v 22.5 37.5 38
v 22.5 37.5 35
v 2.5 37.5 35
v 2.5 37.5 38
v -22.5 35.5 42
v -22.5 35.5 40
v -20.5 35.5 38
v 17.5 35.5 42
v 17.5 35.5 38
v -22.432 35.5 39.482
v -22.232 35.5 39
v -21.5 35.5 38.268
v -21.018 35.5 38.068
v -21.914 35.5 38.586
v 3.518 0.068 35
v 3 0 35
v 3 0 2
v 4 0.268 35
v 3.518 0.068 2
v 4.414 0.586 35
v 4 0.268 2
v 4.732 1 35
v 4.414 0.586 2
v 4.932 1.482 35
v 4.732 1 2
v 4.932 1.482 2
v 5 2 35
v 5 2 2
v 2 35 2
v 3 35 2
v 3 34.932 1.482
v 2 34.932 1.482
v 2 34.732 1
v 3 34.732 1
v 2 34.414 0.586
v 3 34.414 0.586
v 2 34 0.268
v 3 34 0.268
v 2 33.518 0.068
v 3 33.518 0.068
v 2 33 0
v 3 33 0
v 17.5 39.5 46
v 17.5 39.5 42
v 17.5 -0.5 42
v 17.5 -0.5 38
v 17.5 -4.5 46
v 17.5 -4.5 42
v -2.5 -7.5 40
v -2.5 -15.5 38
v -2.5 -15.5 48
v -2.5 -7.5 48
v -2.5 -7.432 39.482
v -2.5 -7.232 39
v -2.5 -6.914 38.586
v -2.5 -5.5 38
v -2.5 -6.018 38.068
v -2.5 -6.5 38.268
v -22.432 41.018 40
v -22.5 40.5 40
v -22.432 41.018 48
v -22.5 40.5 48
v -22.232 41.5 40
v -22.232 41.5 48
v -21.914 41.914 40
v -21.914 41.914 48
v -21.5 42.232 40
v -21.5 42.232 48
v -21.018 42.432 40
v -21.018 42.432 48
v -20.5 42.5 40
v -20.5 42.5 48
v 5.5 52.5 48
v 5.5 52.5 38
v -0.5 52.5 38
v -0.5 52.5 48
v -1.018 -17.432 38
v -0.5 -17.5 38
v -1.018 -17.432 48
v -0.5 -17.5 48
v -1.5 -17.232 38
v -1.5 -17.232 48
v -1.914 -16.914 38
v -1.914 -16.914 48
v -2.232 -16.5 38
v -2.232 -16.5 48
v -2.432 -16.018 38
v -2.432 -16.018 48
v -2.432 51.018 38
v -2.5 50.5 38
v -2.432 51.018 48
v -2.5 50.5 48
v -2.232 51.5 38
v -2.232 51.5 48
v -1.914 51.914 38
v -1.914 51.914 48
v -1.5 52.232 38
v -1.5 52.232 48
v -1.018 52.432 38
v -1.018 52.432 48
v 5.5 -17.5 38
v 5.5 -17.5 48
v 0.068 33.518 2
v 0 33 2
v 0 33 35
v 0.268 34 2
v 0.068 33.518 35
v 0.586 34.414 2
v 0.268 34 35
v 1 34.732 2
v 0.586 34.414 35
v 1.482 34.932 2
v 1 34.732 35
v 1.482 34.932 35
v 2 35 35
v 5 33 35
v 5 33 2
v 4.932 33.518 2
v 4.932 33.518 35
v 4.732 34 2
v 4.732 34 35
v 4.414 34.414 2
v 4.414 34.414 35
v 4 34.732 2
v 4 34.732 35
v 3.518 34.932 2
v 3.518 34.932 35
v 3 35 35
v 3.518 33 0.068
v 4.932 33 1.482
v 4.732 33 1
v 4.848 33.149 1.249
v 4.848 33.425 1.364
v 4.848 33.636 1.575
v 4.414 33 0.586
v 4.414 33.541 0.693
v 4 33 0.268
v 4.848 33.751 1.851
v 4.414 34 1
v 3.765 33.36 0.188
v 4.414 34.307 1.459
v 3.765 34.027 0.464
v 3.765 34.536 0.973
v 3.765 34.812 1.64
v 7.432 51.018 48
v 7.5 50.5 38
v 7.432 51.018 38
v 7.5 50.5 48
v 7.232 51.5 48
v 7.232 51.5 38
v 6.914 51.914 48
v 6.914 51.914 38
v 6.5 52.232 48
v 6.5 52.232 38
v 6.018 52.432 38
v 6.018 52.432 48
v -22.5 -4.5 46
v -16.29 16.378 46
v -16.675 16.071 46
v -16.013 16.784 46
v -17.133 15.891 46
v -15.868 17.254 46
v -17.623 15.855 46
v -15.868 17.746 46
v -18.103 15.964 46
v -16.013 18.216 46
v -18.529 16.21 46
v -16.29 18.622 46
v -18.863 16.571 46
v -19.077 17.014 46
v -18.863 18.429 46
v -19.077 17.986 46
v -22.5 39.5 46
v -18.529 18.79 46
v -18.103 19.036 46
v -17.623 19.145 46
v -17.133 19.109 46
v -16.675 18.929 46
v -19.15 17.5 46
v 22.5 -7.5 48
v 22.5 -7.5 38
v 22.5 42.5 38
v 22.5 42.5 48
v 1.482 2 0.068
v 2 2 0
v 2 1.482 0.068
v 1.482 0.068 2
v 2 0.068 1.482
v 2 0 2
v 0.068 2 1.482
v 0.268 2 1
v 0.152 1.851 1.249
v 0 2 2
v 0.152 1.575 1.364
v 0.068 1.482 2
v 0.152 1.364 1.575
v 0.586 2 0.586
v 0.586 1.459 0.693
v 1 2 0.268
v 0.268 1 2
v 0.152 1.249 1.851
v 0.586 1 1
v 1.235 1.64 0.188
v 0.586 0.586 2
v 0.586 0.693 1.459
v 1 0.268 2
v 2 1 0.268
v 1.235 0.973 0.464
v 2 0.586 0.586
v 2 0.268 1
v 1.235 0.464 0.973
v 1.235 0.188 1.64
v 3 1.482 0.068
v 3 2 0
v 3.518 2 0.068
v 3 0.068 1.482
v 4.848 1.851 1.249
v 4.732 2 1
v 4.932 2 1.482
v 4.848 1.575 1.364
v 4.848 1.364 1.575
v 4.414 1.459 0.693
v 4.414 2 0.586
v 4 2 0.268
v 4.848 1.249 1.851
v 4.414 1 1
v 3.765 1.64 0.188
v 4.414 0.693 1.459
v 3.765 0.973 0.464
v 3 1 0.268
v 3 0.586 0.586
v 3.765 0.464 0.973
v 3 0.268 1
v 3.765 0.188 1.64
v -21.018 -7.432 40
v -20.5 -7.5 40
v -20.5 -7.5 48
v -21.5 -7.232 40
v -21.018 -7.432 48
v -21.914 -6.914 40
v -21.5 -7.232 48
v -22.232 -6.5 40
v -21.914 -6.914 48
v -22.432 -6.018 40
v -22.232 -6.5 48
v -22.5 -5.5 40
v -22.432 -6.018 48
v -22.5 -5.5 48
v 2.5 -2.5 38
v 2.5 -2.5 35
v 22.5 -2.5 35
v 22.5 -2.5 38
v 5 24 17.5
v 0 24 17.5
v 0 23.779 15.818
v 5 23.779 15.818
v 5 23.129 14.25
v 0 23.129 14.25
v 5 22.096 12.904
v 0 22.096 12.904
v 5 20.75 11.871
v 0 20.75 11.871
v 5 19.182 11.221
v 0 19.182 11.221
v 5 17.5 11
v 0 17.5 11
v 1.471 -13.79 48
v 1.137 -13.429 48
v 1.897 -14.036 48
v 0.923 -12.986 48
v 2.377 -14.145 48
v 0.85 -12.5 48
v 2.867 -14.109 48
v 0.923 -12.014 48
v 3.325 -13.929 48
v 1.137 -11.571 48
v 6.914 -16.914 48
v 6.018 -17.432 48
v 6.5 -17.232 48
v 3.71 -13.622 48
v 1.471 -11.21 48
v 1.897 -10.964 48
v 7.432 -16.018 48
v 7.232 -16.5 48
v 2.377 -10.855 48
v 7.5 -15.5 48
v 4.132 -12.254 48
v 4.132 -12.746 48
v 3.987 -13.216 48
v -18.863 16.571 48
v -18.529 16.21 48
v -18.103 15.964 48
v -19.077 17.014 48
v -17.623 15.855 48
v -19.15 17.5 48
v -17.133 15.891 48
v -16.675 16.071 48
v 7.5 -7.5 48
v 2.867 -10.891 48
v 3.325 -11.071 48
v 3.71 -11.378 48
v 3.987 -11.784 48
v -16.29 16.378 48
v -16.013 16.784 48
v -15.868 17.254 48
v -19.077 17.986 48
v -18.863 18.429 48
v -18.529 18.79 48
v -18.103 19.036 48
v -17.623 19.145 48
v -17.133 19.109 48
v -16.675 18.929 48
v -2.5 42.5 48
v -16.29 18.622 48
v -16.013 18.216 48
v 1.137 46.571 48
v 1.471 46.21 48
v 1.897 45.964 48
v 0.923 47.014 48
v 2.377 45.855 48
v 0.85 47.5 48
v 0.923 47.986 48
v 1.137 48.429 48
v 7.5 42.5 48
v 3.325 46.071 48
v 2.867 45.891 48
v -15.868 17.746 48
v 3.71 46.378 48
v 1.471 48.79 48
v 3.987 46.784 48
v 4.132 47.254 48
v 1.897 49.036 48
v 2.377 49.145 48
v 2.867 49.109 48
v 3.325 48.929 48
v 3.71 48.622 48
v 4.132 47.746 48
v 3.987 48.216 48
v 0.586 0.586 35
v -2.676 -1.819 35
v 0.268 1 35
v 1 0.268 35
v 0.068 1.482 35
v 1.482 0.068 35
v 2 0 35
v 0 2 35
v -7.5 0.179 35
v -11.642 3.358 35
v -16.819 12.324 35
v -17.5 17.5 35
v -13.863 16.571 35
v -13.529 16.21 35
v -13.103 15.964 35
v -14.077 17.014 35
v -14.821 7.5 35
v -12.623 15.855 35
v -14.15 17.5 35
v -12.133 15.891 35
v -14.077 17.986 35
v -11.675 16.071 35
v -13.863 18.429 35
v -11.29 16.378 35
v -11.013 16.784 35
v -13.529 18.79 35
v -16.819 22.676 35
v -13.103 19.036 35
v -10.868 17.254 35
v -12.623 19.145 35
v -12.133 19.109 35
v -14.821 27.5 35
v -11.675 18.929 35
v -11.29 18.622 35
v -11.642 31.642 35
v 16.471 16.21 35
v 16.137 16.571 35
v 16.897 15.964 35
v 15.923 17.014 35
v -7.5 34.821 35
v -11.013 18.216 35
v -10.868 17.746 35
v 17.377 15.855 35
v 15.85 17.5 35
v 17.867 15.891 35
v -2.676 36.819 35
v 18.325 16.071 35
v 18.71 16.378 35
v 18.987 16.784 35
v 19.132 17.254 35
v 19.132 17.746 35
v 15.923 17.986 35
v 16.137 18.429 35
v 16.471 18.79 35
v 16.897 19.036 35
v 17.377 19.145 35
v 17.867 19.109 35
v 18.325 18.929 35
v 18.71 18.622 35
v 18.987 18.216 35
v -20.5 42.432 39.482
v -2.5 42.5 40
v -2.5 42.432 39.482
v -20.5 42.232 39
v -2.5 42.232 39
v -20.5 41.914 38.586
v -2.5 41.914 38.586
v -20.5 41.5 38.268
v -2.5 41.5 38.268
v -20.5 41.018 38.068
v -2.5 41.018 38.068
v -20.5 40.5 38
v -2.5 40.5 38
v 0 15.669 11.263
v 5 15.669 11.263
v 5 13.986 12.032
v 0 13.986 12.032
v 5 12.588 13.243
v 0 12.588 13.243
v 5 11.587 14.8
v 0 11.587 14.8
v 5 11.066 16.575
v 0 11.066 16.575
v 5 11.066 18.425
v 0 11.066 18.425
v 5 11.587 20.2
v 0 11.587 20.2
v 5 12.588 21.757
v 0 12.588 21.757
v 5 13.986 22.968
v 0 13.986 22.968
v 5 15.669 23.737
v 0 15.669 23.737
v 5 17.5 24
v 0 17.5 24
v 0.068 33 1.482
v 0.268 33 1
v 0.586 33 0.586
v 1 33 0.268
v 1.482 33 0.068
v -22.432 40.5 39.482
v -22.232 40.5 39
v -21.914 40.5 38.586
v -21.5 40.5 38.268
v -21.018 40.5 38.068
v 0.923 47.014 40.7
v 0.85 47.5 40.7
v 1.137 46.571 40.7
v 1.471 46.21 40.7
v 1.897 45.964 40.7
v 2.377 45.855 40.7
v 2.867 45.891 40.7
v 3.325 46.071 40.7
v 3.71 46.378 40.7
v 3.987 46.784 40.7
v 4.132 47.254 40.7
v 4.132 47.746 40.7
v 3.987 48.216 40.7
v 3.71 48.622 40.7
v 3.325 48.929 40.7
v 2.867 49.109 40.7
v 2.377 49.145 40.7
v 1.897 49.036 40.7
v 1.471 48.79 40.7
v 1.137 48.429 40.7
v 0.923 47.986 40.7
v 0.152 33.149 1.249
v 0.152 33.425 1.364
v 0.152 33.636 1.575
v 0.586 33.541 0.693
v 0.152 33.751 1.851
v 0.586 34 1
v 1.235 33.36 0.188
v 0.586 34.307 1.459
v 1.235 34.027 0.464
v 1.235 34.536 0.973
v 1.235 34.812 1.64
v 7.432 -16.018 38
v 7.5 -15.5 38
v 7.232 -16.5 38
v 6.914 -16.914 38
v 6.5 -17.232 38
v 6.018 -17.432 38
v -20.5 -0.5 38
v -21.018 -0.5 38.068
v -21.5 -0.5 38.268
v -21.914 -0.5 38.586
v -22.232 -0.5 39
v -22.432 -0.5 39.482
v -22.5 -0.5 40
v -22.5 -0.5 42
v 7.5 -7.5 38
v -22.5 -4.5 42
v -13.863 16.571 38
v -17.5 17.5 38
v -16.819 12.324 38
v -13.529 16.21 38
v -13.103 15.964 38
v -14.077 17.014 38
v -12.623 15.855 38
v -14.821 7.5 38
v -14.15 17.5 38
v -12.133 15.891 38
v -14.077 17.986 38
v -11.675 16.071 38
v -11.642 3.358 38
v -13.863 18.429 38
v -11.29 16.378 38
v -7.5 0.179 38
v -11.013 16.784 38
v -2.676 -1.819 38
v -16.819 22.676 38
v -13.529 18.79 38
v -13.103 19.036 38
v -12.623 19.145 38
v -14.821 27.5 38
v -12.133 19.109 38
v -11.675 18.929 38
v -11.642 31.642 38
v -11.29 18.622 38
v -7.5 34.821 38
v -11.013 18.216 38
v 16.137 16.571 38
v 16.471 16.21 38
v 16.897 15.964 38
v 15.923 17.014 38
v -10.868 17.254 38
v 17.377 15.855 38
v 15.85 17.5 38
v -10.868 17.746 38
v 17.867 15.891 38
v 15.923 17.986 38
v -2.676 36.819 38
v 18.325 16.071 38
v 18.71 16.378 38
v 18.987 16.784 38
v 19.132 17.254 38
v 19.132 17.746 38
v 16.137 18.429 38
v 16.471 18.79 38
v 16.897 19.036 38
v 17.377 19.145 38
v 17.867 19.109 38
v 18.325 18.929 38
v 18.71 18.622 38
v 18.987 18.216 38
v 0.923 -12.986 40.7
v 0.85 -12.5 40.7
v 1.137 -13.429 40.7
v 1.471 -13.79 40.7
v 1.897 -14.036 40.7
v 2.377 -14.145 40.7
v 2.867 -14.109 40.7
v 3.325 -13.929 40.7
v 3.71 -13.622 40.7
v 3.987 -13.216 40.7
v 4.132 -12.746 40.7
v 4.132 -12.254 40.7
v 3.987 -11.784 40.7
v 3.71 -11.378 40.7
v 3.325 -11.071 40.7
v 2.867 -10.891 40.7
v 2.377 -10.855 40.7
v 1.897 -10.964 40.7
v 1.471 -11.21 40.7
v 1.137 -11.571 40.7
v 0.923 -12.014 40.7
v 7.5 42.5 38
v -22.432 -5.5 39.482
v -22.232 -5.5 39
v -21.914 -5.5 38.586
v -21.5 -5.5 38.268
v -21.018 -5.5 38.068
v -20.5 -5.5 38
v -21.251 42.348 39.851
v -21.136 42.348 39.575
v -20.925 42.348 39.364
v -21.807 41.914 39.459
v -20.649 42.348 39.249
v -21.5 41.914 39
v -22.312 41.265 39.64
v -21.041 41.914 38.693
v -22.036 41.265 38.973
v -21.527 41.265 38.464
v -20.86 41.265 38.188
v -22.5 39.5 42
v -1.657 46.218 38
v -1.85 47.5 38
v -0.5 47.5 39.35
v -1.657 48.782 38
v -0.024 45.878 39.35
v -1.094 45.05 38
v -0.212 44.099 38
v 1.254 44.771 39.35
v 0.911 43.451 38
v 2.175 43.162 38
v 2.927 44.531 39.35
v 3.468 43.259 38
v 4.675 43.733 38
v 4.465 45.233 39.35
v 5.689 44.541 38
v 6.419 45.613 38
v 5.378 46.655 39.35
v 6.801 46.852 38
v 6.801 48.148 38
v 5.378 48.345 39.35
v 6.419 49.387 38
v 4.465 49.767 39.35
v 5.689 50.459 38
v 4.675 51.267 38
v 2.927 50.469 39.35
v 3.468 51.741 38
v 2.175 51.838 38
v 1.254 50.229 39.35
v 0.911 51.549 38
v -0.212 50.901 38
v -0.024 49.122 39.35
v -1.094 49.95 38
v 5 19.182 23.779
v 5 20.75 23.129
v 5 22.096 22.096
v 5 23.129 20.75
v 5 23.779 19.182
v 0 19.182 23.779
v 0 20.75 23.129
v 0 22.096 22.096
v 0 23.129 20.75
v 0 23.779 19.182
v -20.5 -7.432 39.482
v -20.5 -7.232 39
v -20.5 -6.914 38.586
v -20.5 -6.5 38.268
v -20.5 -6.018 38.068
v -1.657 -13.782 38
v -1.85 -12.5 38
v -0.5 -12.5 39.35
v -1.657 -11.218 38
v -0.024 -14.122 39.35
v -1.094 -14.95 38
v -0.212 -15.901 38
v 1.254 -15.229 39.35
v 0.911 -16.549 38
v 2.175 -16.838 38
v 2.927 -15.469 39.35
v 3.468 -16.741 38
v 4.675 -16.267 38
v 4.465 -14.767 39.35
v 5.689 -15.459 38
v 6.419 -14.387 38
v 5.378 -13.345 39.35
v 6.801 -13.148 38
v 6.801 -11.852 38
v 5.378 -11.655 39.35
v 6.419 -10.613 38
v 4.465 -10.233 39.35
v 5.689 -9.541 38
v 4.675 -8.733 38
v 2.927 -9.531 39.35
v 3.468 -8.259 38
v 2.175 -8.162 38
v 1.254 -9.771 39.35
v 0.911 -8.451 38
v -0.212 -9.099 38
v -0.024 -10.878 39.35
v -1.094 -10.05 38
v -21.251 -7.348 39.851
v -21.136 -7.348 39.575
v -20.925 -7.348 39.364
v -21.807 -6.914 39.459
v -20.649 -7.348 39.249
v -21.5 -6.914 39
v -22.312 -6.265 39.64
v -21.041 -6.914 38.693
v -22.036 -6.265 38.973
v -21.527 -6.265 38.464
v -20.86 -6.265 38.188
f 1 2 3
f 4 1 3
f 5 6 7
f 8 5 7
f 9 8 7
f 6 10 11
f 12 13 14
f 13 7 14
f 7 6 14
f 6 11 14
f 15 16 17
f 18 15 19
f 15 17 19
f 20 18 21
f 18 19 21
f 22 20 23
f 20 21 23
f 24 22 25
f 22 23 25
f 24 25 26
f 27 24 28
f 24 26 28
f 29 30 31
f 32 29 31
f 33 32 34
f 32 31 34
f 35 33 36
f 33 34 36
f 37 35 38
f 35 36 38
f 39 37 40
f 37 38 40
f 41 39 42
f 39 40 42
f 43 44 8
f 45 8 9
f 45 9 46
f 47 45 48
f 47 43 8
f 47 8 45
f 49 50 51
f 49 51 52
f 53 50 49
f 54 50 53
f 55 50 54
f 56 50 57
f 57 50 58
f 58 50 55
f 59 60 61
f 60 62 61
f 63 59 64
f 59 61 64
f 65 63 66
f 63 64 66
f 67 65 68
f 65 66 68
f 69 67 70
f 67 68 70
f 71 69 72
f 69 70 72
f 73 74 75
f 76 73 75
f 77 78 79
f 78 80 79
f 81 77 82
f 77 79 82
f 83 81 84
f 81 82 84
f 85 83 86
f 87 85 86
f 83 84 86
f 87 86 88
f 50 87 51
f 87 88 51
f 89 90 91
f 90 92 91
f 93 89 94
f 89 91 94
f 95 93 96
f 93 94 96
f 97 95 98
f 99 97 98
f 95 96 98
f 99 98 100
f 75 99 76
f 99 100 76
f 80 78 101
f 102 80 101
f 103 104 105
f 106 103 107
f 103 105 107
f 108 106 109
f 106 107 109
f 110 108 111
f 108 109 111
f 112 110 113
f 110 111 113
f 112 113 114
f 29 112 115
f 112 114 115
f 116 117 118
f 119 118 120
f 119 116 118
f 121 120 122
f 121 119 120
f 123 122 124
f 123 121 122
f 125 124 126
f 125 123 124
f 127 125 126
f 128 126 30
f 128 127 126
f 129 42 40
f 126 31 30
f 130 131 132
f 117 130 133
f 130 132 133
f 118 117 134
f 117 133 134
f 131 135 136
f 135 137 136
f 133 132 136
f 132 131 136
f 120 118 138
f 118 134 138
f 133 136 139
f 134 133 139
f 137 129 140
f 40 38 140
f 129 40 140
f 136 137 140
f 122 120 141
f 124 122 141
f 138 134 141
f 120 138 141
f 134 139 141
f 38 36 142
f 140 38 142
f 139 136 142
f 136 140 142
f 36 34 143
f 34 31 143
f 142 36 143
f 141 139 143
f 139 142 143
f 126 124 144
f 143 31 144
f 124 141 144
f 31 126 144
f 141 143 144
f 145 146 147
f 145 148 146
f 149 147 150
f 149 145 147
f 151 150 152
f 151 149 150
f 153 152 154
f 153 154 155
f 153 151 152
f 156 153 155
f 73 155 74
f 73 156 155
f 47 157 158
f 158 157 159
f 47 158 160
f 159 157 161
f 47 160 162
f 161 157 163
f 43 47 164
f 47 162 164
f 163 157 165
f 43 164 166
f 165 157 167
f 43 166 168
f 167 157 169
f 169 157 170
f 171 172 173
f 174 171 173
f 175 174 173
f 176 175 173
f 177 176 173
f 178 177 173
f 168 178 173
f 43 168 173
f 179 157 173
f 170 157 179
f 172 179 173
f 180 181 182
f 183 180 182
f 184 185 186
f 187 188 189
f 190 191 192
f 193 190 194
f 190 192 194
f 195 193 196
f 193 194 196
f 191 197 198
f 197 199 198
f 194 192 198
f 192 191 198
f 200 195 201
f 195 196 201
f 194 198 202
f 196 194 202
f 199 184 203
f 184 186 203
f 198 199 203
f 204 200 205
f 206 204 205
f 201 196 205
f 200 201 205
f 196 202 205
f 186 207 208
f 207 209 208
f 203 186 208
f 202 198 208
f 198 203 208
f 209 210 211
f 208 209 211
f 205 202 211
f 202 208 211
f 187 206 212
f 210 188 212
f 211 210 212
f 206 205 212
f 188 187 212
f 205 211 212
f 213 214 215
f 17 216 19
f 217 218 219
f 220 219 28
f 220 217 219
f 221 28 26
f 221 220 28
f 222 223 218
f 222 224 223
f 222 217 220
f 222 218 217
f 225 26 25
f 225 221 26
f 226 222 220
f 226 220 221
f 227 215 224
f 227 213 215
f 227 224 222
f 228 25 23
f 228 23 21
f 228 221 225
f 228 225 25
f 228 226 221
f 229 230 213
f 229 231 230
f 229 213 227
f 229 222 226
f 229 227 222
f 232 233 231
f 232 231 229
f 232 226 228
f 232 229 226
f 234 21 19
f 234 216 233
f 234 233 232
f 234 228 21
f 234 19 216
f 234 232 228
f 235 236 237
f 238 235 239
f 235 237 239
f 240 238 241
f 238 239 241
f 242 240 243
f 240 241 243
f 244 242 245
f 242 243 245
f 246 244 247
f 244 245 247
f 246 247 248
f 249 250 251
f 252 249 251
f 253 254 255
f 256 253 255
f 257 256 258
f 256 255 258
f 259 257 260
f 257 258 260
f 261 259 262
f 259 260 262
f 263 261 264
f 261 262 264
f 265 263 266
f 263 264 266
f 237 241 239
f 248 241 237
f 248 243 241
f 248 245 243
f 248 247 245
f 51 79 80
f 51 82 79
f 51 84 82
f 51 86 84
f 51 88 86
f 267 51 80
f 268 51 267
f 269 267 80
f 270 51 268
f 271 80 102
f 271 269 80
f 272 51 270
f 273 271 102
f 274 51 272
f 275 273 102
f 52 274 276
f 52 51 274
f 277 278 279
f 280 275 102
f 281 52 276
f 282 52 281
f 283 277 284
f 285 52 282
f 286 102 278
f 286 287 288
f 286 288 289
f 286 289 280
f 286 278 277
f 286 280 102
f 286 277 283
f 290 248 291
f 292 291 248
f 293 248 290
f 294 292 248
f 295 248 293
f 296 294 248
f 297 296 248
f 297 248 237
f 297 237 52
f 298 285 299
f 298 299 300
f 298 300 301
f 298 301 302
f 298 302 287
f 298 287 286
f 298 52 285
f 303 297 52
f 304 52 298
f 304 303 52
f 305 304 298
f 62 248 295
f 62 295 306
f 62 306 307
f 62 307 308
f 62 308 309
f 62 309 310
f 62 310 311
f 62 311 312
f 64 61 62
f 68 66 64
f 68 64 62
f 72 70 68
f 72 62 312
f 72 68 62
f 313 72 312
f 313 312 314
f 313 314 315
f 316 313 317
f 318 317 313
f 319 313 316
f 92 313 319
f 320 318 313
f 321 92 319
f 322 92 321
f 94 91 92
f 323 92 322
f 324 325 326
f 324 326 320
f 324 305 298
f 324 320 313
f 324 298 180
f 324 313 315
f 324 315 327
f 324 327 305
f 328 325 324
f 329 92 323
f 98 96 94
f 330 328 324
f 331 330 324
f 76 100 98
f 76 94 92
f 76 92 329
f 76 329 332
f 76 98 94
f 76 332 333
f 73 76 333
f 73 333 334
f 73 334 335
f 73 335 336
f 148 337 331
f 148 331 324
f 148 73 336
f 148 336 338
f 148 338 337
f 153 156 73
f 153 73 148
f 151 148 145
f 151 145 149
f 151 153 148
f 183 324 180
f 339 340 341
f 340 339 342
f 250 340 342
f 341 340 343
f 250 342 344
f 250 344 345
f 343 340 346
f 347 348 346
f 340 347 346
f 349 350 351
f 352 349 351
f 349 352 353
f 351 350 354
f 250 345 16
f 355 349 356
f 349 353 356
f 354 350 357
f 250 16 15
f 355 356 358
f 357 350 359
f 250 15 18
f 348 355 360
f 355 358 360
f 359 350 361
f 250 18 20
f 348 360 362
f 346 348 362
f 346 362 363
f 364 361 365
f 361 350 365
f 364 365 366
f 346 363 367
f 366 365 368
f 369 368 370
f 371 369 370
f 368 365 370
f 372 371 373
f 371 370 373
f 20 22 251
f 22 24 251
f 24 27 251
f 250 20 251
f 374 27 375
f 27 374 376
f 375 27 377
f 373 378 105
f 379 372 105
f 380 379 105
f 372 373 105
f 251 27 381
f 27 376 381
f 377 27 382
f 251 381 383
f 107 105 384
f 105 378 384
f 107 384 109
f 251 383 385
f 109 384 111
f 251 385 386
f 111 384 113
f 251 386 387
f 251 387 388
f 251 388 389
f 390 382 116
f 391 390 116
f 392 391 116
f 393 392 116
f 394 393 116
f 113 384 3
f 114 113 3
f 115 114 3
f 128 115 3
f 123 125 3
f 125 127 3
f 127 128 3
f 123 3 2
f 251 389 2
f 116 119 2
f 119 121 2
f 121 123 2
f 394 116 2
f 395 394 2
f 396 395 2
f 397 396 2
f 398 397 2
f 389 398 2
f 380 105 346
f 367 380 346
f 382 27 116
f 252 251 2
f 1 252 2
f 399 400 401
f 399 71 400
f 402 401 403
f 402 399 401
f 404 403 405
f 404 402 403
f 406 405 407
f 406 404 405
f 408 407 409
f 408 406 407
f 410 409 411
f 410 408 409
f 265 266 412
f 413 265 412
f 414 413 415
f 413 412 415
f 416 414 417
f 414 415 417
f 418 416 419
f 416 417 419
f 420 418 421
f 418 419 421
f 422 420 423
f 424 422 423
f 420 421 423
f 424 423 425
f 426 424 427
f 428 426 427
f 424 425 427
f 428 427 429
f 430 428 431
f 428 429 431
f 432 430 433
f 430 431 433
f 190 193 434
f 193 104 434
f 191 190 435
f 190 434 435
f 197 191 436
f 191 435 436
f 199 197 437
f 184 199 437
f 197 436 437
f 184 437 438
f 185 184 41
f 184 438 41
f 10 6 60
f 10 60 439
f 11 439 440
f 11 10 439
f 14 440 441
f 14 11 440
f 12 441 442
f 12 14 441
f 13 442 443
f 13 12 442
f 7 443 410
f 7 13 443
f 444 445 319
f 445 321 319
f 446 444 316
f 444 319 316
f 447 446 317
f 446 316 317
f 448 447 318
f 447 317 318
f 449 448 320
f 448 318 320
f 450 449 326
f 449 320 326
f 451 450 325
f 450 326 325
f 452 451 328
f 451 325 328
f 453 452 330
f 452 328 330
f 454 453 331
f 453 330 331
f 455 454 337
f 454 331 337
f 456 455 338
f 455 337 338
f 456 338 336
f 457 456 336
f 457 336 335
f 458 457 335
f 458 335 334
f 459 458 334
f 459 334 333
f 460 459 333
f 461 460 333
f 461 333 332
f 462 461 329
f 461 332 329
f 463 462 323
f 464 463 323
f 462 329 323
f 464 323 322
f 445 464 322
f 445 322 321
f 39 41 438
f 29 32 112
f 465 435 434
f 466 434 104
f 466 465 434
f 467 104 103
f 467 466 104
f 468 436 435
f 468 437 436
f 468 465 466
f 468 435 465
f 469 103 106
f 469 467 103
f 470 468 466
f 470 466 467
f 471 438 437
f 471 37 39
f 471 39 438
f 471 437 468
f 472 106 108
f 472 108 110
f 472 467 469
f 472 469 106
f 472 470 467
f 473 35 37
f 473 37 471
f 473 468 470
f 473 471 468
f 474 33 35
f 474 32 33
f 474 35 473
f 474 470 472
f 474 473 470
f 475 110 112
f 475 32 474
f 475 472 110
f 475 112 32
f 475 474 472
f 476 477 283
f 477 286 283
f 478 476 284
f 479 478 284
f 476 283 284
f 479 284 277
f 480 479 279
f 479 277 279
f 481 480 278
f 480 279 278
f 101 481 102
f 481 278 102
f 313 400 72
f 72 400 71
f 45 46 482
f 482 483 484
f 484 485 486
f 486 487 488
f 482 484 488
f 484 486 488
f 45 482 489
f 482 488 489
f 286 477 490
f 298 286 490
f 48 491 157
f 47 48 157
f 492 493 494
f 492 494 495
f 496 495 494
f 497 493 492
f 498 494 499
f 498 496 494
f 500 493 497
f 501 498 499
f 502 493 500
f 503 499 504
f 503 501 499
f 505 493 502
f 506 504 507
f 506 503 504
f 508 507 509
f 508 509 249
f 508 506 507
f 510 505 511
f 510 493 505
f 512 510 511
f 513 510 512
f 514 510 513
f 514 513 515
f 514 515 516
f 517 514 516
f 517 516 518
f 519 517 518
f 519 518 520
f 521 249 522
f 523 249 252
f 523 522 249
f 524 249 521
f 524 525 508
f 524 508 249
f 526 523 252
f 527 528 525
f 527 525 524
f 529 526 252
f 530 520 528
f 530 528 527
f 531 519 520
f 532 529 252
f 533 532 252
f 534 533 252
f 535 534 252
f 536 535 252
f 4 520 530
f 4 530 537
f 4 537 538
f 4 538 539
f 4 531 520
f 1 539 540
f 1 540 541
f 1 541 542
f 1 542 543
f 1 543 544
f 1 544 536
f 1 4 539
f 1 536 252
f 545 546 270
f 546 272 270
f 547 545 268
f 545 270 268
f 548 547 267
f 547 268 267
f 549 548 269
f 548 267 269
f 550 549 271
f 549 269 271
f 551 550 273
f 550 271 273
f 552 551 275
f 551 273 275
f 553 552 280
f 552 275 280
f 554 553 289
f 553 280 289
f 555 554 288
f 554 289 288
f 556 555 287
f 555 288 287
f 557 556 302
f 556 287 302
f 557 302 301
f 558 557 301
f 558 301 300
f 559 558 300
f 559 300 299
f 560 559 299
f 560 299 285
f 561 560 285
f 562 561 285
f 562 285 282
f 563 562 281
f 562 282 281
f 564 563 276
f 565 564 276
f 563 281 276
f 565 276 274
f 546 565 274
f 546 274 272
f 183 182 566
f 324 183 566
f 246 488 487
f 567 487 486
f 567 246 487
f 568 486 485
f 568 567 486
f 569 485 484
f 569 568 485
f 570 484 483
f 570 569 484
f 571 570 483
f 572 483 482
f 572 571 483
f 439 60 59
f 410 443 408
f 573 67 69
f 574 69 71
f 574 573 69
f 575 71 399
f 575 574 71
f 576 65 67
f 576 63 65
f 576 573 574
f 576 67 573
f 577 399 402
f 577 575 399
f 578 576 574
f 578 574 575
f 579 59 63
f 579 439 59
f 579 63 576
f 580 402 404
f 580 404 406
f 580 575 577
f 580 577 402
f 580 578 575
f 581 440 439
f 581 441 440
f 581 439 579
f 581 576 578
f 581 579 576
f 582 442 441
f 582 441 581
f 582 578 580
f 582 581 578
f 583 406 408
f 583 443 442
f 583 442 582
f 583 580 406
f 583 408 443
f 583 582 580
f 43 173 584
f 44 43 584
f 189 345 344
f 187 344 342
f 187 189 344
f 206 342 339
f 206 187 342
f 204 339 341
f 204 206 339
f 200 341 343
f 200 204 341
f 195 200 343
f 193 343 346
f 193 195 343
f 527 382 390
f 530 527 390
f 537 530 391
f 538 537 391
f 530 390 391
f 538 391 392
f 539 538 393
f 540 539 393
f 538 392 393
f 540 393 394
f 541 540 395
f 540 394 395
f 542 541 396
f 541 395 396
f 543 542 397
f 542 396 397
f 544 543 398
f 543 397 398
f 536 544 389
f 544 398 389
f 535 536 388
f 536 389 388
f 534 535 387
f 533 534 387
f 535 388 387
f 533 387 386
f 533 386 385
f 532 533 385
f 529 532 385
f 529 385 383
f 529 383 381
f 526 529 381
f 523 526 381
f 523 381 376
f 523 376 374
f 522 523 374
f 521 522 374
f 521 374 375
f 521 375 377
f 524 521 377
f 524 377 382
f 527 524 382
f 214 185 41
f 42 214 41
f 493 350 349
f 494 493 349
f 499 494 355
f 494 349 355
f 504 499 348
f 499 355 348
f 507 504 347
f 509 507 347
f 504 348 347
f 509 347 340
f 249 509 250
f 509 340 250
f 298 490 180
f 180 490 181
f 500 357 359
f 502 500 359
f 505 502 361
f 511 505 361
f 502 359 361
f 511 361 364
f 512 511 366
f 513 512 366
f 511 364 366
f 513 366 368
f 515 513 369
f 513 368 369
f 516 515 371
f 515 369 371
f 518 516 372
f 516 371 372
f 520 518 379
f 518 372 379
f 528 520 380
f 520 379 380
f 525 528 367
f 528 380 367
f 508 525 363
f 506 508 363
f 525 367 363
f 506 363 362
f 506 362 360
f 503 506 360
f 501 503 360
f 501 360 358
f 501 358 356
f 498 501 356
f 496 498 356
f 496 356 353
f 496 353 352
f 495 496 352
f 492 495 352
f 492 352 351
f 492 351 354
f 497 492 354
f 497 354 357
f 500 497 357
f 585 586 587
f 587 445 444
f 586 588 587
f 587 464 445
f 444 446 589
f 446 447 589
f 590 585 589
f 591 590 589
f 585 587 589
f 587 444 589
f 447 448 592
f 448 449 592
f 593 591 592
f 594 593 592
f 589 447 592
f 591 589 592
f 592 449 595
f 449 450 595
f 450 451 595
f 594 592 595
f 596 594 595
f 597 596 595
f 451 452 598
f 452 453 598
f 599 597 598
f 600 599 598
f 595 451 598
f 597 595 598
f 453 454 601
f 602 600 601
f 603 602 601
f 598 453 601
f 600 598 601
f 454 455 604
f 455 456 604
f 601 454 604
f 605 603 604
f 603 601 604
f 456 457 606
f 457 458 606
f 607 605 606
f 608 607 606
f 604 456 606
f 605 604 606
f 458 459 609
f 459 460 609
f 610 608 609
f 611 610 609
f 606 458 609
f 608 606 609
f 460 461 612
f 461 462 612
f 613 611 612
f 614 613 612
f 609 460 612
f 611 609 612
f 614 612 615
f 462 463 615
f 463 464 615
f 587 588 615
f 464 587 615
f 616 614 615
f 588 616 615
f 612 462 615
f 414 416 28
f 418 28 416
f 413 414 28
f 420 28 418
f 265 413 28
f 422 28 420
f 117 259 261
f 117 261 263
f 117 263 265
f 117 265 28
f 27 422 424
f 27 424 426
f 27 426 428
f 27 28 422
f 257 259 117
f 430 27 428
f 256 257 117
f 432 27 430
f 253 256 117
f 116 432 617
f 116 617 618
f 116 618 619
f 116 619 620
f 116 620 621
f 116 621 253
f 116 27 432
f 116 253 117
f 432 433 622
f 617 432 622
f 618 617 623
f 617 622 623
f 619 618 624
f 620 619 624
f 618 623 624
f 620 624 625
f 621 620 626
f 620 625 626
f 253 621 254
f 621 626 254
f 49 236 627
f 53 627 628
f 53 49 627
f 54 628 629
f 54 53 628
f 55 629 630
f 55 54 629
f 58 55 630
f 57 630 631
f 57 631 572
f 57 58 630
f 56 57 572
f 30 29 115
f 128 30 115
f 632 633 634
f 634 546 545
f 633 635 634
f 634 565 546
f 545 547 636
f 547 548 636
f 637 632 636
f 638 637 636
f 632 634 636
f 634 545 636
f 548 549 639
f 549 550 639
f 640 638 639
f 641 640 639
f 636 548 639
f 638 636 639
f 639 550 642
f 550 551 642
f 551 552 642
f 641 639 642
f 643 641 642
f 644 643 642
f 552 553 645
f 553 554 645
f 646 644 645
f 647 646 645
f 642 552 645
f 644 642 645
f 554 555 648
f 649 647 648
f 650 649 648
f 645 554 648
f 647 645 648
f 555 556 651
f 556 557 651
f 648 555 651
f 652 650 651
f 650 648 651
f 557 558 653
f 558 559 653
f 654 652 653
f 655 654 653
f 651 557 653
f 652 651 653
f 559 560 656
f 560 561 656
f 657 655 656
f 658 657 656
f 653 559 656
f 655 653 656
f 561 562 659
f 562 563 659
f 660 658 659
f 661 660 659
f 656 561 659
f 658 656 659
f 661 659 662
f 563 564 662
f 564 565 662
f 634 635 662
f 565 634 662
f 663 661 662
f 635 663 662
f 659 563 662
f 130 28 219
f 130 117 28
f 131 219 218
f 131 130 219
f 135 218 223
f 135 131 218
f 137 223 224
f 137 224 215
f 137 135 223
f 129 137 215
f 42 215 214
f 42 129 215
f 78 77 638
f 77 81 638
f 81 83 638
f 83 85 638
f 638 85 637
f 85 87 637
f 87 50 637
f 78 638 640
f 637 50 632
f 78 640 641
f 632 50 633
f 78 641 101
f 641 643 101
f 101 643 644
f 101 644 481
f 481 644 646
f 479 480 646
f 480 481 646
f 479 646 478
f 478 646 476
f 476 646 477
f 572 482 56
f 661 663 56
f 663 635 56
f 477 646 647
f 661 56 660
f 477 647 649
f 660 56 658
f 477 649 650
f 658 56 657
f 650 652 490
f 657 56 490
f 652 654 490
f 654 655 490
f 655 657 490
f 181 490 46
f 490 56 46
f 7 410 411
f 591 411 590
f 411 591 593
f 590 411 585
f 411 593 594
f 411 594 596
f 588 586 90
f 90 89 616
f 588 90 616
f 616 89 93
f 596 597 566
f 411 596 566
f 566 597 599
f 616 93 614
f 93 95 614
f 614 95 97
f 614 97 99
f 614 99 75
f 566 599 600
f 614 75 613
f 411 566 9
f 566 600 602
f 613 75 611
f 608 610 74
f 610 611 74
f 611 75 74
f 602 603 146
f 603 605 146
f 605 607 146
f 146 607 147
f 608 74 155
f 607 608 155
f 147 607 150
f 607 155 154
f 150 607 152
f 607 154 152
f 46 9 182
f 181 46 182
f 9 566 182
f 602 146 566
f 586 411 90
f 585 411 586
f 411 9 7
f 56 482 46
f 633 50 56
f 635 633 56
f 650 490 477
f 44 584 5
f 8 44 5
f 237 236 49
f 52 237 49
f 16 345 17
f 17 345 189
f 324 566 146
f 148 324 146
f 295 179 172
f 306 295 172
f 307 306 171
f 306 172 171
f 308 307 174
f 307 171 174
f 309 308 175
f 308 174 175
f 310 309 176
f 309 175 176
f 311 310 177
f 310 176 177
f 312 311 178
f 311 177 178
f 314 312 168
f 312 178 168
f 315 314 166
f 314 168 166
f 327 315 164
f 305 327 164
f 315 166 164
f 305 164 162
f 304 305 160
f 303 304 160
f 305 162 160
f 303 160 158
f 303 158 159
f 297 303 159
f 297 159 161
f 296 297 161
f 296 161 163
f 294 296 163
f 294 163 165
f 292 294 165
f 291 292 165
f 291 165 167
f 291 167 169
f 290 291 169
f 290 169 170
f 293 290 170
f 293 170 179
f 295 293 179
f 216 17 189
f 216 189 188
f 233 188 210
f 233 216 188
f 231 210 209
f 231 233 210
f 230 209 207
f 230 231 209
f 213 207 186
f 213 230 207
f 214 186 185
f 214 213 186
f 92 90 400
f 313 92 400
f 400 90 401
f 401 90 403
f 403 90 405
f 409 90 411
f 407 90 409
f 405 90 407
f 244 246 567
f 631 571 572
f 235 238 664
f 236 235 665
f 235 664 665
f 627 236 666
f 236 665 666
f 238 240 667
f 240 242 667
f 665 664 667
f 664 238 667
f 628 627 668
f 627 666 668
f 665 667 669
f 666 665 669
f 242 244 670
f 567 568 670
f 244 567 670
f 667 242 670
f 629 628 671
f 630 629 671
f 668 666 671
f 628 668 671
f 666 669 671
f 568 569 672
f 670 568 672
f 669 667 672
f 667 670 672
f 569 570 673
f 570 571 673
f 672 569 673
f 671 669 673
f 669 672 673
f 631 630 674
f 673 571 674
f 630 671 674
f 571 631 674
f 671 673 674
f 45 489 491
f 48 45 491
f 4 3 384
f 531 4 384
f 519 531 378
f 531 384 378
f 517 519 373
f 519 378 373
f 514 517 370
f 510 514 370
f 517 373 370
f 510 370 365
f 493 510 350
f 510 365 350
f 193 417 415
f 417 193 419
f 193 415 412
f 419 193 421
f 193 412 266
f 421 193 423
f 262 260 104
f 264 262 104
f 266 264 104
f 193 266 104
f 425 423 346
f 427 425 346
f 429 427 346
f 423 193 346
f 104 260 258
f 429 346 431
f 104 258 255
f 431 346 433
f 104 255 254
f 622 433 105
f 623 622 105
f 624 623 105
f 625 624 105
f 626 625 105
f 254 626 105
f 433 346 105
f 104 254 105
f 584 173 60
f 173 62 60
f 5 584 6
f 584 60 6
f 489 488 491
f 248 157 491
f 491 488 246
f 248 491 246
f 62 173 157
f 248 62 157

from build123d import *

# Parameters (mm, degrees)
F1_DEPTH        = 5
F3_DEPTH        = 3
F5_D            = 3.3
F6_W            = 2.1666669659
F6_H            = 10
F6_W_2          = 7.8333330341
F7_DEPTH        = 10
F9_DEPTH        = 40
F11_D           = 3.3
F11_DEPTH       = 5
F11_TIP         = 0.9914200214
F12_R           = 2
F14_D           = 3.3
F14_DEPTH       = 10
F14_CSINK_D     = 8.7
F14_CSINK_ANGLE = 90
F14_TIP         = 0.9914200214
F15_R           = 2


with BuildPart() as f1:
    # F0 (on Right) → F1 (new body)
    with BuildSketch(Plane.YZ):
        with BuildLine():
            Line((0, 35), (0, 0))
            Line((0, 0), (17.5, 0))
            Line((17.5, 0), (17.5, 11))
            ThreePointArc((17.5, 11), (11, 17.5), (17.5, 24))
            Line((17.5, 24), (17.5, 35))
            Line((17.5, 35), (0, 35))
        make_face()
        with BuildLine():
            Line((17.5, 11), (17.5, 0))
            Line((17.5, 0), (35, 0))
            Line((35, 0), (35, 35))
            Line((35, 35), (17.5, 35))
            Line((17.5, 35), (17.5, 24))
            ThreePointArc((17.5, 24), (22.0961940777, 22.0961940777), (24, 17.5))
            ThreePointArc((24, 17.5), (22.0961940777, 12.9038059223), (17.5, 11))
        make_face()
    extrude(amount=F1_DEPTH)

    # F2 (on face) → F3 (join)
    with BuildSketch(Plane.XY.offset(35)):
        with BuildLine():
            ThreePointArc((2.5, 37.5), (-11.6421356237, 31.6421356237), (-17.5, 17.5))
            ThreePointArc((-17.5, 17.5), (-11.6421356237, 3.3578643763), (2.5, -2.5))
            ThreePointArc((2.5, -2.5), (16.6421356237, 3.3578643763), (22.5, 17.5))
            ThreePointArc((22.5, 17.5), (16.6421356237, 31.6421356237), (2.5, 37.5))
        make_face()
        Polygon((0, 0), (0, 17.5), (0, 35), (5, 35), (5, 17.5), (5, 0), align=None, mode=Mode.SUBTRACT)
        Polygon((0, 35), (0, 17.5), (2.5, 17.5), (5, 17.5), (5, 35), align=None)
        Polygon((2.5, 17.5), (0, 17.5), (0, 0), (5, 0), (5, 17.5), align=None)
        with BuildLine():
            Line((22.5, 37.5), (2.5, 37.5))
            ThreePointArc((2.5, 37.5), (16.6421356237, 31.6421356237), (22.5, 17.5))
            Line((22.5, 17.5), (22.5, 37.5))
        make_face()
        with BuildLine():
            ThreePointArc((22.5, 17.5), (16.6421356237, 3.3578643763), (2.5, -2.5))
            Line((2.5, -2.5), (22.5, -2.5))
            Line((22.5, -2.5), (22.5, 17.5))
        make_face()
    extrude(amount=F3_DEPTH)

    # F5 (through all)
    with Locations(Plane.XY.offset(38)):
        with Locations((-12.5, 17.5), (17.5, 17.5)):
            Hole(F5_D / 2)

    # F12
    f12_edges = [f1.edges().sort_by_distance(p)[0] for p in [
        (2.5, 0, 0),
        (2.5, 35, 0),
        (0, 17.5, 0),
        (5, 17.5, 0),
        (0, 0, 17.5),
        (5, 0, 17.5),
        (0, 35, 17.5),
        (5, 35, 17.5),
    ]]
    fillet(f12_edges, radius=F12_R)


with BuildPart() as f7:
    # F6 (on face) → F7 (new body)
    with BuildSketch(Plane.XY.offset(38)):
        Polygon((-2.5, 42.5), (2.5, 42.5), (7.5, 42.5), (7.5, 52.5), (-2.5, 52.5), align=None)
        Polygon((7.5, 42.5), (2.5, 42.5), (-2.5, 42.5), (-22.5, 42.5), (-22.5, -7.5), (-2.5, -7.5), (5.3333330341, -7.5), (7.5, -7.5), (22.5, -7.5), (22.5, 42.5), align=None)
        with Locations((6.416666517, -12.5)):
            Rectangle(F6_W, F6_H)
        with Locations((1.416666517, -12.5)):
            Rectangle(F6_W_2, F6_H)
    extrude(amount=F7_DEPTH)

    # F8 (on face) → F9 (cut)
    with BuildSketch(Plane(origin=(-22.5, 0, 0), x_dir=(0, -1, 0), z_dir=(-1, 0, 0))):
        Polygon((-39.5, 46), (-39.5, 42), (-35.5, 42), (0.5, 42), (4.5, 42), (4.5, 46), align=None)
        Polygon((-35.5, 42), (-35.5, 38), (-17.5, 38), (0.5, 38), (0.5, 42), align=None)
    extrude(amount=-F9_DEPTH, mode=Mode.SUBTRACT)

    # F11
    with Locations(Plane.XY.offset(48)):
        with Locations((-17.5, 17.5)):
            Hole(F11_D / 2, depth=F11_DEPTH)
            with Locations((0, 0, -(F11_DEPTH + F11_TIP / 2))):  # 118° drill point
                Cone(0, F11_D / 2, F11_TIP, mode=Mode.SUBTRACT)

    # F14
    with Locations(Plane(origin=(0, 0, 38), x_dir=(1, 0, 0), z_dir=(0, 0, -1))):
        with Locations((2.5, 12.5), (2.5, -47.5)):
            CounterSinkHole(F14_D / 2, F14_CSINK_D / 2, depth=F14_DEPTH, counter_sink_angle=F14_CSINK_ANGLE)
            with Locations((0, 0, -(F14_DEPTH + F14_TIP / 2))):  # 118° drill point
                Cone(0, F14_D / 2, F14_TIP, mode=Mode.SUBTRACT)

    # F15
    f15_edges = [f7.edges().sort_by_distance(p)[0] for p in [
        (-22.5, 39, 38),
        (-22.5, -4, 38),
        (-22.5, -7.5, 43),
        (-22.5, 42.5, 43),
        (-12.5, -7.5, 38),
        (-12.5, 42.5, 38),
        (-2.5, 52.5, 43),
        (-2.5, -17.5, 43),
        (7.5, -17.5, 43),
        (7.5, 52.5, 43),
    ]]
    fillet(f15_edges, radius=F15_R)


solid = Compound([f1.part, f7.part])
